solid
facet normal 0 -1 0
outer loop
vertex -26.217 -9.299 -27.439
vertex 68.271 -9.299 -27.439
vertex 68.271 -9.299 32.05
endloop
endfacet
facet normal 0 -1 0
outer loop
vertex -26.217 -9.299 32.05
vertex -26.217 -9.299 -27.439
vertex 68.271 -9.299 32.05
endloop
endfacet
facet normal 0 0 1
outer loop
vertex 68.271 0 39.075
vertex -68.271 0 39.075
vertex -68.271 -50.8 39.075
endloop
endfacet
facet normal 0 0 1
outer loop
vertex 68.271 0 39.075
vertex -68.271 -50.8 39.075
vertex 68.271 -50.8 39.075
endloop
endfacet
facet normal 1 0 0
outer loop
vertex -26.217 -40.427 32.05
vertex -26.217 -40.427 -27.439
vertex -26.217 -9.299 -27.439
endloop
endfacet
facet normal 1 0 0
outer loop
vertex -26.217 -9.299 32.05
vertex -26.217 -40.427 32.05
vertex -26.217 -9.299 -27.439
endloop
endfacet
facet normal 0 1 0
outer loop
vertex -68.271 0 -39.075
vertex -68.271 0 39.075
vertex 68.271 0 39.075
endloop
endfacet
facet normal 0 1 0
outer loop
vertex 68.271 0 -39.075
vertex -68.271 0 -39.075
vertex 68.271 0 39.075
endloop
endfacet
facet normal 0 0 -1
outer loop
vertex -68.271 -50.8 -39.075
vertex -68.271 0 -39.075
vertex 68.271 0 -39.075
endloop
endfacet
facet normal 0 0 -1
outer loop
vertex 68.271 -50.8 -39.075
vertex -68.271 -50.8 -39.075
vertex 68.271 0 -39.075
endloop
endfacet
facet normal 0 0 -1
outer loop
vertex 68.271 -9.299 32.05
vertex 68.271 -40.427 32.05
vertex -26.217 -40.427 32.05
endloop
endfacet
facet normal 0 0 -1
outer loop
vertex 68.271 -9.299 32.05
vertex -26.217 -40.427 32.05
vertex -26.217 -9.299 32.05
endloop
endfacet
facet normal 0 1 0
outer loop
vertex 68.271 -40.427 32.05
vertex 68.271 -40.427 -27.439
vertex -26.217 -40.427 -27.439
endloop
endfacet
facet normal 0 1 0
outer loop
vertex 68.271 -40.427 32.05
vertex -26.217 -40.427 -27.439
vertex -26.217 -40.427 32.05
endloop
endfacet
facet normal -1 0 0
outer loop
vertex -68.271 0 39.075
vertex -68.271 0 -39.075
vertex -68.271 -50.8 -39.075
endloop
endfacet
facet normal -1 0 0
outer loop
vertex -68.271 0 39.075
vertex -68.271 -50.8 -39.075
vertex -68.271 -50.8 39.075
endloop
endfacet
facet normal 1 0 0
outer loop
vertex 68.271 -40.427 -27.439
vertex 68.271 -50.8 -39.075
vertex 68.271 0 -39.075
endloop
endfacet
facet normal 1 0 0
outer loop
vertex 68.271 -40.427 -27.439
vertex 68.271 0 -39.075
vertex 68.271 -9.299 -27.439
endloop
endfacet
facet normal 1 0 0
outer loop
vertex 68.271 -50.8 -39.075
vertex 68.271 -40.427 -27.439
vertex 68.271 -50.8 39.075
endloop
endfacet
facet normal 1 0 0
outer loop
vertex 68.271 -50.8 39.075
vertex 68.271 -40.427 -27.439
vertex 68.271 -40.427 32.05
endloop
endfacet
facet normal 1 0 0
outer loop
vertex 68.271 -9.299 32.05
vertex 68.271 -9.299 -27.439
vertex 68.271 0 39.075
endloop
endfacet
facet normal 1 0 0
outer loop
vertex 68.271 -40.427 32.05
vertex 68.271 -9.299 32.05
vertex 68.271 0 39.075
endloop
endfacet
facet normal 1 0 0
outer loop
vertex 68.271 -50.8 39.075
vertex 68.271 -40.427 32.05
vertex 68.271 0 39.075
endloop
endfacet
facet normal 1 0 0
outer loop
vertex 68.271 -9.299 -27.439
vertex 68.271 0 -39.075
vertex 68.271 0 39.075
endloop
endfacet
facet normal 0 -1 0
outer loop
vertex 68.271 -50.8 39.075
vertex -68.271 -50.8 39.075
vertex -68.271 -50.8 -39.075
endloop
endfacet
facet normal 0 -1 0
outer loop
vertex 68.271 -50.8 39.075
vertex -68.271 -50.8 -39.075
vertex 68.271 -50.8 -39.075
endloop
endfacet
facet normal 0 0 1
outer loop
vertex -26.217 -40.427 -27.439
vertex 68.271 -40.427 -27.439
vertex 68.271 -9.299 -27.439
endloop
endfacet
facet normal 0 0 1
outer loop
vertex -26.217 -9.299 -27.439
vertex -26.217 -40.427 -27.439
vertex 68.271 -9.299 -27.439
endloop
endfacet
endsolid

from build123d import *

# Parameters (mm, degrees)
F0_W     = 136.54275
F0_H     = 78.149304
F1_DEPTH = 50.8
F2_W     = 31.127811
F2_H     = 59.488708
F3_DEPTH = 94.488


with BuildPart() as f1:
    # F0 (on Front) → F1 (new body)
    with BuildSketch(Plane.XZ):
        Rectangle(F0_W, F0_H)
    extrude(amount=F1_DEPTH)

    # F2 (on face) → F3 (cut)
    with BuildSketch(Plane.YZ.offset(68.271375)):
        with Locations((-24.863321, 2.305764)):
            Rectangle(F2_W, F2_H)
    extrude(amount=-F3_DEPTH, mode=Mode.SUBTRACT)


solid = f1.part
